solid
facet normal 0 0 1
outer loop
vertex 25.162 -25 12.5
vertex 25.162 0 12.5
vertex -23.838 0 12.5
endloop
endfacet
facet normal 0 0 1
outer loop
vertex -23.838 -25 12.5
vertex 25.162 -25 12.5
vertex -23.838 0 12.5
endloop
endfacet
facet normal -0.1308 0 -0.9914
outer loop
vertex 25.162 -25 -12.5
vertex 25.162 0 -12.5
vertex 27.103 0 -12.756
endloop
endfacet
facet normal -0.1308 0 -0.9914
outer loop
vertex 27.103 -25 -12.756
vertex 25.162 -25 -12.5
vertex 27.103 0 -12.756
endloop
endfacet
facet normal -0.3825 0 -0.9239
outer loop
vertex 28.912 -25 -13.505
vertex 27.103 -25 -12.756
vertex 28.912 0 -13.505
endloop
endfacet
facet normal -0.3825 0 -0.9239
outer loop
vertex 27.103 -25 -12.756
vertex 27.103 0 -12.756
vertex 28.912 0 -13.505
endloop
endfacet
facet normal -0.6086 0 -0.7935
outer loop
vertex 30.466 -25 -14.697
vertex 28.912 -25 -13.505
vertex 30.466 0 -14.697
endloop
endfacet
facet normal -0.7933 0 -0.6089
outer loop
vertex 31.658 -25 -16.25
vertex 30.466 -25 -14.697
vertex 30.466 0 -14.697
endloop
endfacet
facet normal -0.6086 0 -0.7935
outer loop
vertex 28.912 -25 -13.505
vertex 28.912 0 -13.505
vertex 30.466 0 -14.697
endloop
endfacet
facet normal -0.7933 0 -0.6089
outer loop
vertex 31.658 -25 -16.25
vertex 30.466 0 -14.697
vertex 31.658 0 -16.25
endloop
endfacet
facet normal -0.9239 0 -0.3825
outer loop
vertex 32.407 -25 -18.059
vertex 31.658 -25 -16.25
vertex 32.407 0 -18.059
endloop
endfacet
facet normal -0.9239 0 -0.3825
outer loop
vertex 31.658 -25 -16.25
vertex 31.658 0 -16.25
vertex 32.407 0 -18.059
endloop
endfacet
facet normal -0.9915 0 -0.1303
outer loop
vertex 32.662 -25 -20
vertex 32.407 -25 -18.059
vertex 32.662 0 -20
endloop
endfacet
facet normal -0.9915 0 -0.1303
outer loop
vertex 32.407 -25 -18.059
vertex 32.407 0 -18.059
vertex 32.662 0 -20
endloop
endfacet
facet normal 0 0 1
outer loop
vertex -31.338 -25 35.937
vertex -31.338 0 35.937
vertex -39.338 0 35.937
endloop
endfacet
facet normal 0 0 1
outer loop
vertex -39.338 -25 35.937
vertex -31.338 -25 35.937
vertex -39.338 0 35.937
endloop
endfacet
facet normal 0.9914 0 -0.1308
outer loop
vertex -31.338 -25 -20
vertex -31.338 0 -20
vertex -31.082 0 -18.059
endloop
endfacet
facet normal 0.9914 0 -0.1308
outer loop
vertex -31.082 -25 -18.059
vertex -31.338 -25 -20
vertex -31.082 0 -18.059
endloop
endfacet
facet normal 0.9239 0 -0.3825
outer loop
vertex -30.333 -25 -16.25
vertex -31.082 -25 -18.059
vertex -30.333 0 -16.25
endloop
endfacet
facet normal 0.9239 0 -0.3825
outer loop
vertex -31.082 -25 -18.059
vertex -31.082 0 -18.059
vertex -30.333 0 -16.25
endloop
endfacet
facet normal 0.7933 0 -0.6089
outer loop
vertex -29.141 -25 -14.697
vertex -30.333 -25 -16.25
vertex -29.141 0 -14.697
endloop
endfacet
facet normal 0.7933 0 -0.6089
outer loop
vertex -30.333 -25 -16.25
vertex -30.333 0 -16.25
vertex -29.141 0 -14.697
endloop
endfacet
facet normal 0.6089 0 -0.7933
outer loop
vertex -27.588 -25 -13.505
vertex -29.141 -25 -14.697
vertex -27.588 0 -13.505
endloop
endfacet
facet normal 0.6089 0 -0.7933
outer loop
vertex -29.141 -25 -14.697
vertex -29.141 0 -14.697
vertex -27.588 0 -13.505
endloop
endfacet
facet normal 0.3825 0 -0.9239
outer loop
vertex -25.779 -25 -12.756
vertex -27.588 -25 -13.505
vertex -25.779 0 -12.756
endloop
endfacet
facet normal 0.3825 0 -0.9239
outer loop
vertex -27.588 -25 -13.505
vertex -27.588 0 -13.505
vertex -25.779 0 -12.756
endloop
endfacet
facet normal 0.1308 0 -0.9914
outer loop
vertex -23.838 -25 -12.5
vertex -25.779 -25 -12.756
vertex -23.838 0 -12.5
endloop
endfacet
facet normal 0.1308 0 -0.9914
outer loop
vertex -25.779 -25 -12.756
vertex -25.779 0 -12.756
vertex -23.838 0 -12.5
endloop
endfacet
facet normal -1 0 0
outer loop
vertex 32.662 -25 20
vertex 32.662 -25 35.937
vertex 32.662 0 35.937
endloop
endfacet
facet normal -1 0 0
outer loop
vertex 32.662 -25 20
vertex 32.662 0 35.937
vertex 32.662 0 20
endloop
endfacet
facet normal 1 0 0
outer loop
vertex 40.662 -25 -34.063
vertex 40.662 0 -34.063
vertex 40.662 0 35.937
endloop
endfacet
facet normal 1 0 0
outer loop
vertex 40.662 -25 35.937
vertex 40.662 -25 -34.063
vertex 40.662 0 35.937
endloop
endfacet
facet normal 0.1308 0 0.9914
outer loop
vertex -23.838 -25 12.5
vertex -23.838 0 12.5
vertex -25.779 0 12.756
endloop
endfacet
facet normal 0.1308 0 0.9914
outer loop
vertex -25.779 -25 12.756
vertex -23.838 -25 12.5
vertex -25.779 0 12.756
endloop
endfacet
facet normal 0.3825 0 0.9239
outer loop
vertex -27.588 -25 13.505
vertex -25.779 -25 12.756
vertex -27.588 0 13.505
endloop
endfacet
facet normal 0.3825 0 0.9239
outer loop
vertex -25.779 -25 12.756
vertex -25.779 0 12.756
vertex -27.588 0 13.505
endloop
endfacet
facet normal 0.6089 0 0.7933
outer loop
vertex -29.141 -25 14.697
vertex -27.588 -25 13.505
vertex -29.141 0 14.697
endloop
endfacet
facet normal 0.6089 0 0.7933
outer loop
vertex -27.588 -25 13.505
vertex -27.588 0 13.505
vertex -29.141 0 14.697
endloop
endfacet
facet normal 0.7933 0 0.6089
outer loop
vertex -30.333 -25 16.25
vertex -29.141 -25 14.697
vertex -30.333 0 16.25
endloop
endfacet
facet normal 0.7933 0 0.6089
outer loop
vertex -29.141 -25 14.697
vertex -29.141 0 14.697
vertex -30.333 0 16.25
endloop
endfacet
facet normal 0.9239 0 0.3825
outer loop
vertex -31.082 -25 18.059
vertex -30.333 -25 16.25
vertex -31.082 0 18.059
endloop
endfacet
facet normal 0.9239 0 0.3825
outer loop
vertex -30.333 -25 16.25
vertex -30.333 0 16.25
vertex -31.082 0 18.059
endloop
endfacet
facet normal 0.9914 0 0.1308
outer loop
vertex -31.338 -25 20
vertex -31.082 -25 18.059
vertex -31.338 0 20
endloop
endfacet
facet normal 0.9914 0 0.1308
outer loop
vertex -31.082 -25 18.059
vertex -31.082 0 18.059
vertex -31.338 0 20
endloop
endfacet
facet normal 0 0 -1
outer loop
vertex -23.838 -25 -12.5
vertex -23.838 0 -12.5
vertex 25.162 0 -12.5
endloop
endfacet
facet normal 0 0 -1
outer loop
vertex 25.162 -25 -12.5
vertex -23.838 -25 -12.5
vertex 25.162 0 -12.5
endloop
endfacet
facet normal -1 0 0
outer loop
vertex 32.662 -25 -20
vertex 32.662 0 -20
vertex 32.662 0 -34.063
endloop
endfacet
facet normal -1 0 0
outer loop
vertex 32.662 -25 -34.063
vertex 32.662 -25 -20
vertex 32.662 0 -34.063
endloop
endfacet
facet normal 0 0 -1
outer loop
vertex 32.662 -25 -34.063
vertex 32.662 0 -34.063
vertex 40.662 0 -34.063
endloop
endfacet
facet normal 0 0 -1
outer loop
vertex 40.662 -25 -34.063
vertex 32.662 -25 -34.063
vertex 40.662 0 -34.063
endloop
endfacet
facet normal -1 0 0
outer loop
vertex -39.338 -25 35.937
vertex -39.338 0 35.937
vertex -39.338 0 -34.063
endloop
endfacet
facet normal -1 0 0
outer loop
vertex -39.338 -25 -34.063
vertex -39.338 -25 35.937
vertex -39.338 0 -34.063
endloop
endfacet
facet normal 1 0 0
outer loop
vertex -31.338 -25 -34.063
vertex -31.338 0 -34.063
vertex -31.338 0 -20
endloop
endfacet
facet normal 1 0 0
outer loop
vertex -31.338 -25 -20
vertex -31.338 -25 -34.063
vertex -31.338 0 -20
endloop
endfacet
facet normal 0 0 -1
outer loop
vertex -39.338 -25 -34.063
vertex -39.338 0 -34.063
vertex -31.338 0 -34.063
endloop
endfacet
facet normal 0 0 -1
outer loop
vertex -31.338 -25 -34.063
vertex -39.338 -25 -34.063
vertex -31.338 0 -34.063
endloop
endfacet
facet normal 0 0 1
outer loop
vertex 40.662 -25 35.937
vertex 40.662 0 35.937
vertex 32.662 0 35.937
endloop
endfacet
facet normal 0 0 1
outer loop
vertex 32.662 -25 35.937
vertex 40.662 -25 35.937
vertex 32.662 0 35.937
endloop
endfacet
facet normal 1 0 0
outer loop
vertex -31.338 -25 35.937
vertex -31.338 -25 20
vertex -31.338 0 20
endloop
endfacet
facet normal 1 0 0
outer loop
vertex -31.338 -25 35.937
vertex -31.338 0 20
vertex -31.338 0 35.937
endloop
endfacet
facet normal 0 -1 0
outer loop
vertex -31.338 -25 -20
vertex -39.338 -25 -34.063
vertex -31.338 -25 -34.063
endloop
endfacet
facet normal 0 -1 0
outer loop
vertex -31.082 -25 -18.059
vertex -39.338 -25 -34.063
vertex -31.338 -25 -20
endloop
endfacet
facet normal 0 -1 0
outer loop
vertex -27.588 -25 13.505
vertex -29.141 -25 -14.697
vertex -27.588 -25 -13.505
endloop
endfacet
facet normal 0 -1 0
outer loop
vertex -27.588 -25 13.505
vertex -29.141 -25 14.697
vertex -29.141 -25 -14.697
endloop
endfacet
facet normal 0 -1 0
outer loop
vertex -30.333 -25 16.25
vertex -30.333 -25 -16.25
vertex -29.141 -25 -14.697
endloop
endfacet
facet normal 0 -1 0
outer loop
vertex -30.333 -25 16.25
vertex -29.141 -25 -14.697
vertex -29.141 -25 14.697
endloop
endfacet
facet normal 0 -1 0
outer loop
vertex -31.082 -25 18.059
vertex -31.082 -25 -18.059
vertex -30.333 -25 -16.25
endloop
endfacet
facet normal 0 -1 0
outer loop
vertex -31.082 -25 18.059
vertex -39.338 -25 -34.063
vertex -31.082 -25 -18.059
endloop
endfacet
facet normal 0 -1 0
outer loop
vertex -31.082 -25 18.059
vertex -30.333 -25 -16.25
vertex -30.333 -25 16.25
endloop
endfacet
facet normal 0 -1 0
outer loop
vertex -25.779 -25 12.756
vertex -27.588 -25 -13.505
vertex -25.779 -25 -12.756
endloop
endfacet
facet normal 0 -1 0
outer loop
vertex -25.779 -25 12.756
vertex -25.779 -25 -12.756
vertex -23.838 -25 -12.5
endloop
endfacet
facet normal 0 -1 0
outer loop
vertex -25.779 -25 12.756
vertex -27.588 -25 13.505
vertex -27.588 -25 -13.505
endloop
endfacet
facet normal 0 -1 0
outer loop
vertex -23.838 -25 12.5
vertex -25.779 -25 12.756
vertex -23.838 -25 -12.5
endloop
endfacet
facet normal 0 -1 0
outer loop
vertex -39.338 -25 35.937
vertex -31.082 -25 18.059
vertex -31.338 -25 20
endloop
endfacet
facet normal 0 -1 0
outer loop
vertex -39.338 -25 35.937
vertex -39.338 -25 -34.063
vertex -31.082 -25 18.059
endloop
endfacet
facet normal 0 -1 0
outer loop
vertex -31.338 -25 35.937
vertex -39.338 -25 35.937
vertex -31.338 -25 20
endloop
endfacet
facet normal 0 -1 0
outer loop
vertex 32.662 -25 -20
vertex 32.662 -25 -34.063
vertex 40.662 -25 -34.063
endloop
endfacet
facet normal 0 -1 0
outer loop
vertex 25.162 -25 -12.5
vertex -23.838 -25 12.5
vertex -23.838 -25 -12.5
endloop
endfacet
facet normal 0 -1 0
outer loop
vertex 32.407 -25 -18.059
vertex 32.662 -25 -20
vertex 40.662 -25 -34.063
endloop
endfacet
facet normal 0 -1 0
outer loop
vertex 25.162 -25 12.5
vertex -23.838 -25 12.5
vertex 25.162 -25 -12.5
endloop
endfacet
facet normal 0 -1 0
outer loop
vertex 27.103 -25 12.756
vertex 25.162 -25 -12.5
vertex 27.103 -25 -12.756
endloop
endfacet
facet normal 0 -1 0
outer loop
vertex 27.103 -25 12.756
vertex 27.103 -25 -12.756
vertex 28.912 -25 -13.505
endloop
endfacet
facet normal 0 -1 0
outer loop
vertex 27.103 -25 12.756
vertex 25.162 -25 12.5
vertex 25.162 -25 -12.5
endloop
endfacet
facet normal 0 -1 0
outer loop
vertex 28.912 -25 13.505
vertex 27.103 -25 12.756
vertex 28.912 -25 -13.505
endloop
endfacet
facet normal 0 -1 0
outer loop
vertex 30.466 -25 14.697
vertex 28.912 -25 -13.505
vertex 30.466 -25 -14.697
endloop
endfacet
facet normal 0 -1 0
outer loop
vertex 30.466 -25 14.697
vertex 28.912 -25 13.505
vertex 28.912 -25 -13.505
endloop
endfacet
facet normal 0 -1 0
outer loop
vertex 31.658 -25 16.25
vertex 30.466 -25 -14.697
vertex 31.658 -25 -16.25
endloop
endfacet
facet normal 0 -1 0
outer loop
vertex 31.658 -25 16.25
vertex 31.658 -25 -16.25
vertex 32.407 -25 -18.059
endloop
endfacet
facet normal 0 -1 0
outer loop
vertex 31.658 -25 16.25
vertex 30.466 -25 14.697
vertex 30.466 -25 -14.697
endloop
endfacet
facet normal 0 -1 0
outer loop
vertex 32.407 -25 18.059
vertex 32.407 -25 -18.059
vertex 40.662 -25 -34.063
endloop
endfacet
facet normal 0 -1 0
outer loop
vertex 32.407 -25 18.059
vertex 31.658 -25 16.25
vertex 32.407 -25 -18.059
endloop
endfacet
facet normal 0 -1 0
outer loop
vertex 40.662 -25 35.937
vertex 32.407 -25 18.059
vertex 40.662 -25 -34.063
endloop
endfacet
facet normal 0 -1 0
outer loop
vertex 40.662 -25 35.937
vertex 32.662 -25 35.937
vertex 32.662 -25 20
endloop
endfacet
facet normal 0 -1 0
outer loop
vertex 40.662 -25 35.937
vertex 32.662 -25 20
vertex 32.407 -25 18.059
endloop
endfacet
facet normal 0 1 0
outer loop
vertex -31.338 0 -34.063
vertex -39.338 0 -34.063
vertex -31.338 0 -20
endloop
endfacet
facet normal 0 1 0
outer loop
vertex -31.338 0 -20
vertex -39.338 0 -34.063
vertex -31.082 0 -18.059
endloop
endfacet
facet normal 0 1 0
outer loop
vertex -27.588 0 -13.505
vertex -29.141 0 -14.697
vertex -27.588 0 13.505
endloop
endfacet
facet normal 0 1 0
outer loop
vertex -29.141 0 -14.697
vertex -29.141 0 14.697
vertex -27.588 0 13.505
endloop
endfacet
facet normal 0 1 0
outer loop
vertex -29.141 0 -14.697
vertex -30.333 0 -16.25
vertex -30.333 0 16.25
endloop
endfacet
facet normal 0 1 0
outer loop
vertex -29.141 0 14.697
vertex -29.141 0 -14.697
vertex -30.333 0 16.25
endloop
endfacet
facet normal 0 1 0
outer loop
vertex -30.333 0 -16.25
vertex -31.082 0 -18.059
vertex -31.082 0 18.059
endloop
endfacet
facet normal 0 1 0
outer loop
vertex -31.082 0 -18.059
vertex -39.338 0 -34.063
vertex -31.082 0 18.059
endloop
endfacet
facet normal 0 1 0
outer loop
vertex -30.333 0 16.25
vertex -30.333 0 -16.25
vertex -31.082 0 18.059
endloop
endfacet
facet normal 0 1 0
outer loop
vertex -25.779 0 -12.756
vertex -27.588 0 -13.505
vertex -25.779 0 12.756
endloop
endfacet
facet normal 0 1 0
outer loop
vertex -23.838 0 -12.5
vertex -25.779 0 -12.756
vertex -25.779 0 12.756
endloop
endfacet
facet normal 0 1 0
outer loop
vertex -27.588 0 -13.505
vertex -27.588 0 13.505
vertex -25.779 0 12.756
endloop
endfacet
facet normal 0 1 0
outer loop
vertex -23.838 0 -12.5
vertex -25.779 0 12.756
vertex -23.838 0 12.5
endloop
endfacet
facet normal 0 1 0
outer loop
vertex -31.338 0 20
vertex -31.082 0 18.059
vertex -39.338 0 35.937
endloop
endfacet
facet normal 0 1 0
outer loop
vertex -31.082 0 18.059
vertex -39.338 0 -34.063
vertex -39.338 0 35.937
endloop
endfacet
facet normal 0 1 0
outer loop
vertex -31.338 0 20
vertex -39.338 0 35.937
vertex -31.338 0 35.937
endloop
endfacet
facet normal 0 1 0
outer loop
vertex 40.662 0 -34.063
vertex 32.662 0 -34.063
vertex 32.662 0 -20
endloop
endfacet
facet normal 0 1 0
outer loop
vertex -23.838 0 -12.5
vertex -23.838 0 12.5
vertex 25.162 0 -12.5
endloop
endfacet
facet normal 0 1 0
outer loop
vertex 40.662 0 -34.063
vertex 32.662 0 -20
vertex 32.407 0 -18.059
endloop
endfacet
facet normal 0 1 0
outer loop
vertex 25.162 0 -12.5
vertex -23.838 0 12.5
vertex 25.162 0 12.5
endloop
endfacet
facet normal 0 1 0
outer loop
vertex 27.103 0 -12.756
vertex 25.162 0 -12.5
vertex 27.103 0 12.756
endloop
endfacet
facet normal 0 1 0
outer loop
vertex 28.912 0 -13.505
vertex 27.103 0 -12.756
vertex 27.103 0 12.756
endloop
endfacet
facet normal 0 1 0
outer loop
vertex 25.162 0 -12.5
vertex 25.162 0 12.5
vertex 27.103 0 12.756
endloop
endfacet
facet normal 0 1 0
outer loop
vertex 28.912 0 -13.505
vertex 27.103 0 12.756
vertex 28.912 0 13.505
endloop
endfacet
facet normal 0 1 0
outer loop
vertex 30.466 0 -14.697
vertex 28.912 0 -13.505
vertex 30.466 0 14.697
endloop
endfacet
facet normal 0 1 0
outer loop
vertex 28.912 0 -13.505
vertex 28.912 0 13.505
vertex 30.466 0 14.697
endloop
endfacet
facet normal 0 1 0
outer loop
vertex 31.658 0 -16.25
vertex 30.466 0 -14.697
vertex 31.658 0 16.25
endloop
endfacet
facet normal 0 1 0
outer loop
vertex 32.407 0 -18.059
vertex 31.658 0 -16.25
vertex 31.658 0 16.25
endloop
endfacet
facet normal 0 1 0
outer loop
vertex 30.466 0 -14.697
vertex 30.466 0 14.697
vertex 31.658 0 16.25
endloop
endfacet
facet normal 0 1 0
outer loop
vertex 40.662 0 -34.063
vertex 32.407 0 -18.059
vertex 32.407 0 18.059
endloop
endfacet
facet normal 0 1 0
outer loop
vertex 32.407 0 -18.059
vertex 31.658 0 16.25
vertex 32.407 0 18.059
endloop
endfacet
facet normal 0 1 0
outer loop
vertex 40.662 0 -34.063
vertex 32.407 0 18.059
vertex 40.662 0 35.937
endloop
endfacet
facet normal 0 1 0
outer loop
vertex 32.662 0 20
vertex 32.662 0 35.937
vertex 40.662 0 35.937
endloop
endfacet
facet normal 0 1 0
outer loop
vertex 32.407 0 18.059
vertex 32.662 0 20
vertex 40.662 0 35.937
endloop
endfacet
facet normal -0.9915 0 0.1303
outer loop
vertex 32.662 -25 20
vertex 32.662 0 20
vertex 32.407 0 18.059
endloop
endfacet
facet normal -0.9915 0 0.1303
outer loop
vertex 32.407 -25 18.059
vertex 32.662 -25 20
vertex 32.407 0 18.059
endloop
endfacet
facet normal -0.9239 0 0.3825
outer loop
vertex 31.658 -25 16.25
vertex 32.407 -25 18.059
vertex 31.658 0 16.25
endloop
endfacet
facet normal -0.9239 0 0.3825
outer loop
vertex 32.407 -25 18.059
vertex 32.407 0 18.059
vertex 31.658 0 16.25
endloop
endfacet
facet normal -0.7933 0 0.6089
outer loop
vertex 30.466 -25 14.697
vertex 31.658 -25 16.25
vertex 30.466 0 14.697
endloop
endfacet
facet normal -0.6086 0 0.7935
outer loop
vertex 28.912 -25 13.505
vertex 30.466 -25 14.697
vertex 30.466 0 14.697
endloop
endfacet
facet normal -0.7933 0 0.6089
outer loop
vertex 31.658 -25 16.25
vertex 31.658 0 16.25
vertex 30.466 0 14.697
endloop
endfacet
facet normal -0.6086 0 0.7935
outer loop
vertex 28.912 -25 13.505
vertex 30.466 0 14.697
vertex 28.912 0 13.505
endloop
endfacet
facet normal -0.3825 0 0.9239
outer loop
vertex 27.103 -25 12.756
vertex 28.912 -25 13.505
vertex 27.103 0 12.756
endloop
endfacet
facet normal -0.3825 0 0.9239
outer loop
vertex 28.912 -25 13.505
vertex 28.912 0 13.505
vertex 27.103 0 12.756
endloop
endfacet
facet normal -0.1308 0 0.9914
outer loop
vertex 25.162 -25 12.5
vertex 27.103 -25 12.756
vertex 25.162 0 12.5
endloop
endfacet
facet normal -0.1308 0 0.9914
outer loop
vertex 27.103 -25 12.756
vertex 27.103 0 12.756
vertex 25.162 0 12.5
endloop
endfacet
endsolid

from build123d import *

# Parameters (mm, degrees)
F1_DEPTH = 25


with BuildPart() as f1:
    # F0 (on Front) → F1 (new body)
    with BuildSketch(Plane.XZ):
        with BuildLine():
            Line((-31.33769, 35.93692), (-39.33769, 35.93692))
            Line((-39.33769, 35.93692), (-39.33769, -34.06308))
            Line((-39.33769, -34.06308), (-31.33769, -34.06308))
            Line((-31.33769, -34.06308), (-31.33769, -20))
            ThreePointArc((-31.33769, -20), (-29.140991, -14.696699), (-23.83769, -12.5))
            Line((-23.83769, -12.5), (25.16231, -12.5))
            ThreePointArc((25.16231, -12.5), (30.465611, -14.696699), (32.66231, -20))
            Line((32.66231, -20), (32.66231, -34.06308))
            Line((32.66231, -34.06308), (40.66231, -34.06308))
            Line((40.66231, -34.06308), (40.66231, 35.93692))
            Line((40.66231, 35.93692), (32.66231, 35.93692))
            Line((32.66231, 35.93692), (32.66231, 20))
            ThreePointArc((32.66231, 20), (30.465611, 14.696699), (25.16231, 12.5))
            Line((25.16231, 12.5), (-23.83769, 12.5))
            ThreePointArc((-23.83769, 12.5), (-29.140991, 14.696699), (-31.33769, 20))
            Line((-31.33769, 20), (-31.33769, 35.93692))
        make_face()
    extrude(amount=F1_DEPTH)


solid = f1.part
